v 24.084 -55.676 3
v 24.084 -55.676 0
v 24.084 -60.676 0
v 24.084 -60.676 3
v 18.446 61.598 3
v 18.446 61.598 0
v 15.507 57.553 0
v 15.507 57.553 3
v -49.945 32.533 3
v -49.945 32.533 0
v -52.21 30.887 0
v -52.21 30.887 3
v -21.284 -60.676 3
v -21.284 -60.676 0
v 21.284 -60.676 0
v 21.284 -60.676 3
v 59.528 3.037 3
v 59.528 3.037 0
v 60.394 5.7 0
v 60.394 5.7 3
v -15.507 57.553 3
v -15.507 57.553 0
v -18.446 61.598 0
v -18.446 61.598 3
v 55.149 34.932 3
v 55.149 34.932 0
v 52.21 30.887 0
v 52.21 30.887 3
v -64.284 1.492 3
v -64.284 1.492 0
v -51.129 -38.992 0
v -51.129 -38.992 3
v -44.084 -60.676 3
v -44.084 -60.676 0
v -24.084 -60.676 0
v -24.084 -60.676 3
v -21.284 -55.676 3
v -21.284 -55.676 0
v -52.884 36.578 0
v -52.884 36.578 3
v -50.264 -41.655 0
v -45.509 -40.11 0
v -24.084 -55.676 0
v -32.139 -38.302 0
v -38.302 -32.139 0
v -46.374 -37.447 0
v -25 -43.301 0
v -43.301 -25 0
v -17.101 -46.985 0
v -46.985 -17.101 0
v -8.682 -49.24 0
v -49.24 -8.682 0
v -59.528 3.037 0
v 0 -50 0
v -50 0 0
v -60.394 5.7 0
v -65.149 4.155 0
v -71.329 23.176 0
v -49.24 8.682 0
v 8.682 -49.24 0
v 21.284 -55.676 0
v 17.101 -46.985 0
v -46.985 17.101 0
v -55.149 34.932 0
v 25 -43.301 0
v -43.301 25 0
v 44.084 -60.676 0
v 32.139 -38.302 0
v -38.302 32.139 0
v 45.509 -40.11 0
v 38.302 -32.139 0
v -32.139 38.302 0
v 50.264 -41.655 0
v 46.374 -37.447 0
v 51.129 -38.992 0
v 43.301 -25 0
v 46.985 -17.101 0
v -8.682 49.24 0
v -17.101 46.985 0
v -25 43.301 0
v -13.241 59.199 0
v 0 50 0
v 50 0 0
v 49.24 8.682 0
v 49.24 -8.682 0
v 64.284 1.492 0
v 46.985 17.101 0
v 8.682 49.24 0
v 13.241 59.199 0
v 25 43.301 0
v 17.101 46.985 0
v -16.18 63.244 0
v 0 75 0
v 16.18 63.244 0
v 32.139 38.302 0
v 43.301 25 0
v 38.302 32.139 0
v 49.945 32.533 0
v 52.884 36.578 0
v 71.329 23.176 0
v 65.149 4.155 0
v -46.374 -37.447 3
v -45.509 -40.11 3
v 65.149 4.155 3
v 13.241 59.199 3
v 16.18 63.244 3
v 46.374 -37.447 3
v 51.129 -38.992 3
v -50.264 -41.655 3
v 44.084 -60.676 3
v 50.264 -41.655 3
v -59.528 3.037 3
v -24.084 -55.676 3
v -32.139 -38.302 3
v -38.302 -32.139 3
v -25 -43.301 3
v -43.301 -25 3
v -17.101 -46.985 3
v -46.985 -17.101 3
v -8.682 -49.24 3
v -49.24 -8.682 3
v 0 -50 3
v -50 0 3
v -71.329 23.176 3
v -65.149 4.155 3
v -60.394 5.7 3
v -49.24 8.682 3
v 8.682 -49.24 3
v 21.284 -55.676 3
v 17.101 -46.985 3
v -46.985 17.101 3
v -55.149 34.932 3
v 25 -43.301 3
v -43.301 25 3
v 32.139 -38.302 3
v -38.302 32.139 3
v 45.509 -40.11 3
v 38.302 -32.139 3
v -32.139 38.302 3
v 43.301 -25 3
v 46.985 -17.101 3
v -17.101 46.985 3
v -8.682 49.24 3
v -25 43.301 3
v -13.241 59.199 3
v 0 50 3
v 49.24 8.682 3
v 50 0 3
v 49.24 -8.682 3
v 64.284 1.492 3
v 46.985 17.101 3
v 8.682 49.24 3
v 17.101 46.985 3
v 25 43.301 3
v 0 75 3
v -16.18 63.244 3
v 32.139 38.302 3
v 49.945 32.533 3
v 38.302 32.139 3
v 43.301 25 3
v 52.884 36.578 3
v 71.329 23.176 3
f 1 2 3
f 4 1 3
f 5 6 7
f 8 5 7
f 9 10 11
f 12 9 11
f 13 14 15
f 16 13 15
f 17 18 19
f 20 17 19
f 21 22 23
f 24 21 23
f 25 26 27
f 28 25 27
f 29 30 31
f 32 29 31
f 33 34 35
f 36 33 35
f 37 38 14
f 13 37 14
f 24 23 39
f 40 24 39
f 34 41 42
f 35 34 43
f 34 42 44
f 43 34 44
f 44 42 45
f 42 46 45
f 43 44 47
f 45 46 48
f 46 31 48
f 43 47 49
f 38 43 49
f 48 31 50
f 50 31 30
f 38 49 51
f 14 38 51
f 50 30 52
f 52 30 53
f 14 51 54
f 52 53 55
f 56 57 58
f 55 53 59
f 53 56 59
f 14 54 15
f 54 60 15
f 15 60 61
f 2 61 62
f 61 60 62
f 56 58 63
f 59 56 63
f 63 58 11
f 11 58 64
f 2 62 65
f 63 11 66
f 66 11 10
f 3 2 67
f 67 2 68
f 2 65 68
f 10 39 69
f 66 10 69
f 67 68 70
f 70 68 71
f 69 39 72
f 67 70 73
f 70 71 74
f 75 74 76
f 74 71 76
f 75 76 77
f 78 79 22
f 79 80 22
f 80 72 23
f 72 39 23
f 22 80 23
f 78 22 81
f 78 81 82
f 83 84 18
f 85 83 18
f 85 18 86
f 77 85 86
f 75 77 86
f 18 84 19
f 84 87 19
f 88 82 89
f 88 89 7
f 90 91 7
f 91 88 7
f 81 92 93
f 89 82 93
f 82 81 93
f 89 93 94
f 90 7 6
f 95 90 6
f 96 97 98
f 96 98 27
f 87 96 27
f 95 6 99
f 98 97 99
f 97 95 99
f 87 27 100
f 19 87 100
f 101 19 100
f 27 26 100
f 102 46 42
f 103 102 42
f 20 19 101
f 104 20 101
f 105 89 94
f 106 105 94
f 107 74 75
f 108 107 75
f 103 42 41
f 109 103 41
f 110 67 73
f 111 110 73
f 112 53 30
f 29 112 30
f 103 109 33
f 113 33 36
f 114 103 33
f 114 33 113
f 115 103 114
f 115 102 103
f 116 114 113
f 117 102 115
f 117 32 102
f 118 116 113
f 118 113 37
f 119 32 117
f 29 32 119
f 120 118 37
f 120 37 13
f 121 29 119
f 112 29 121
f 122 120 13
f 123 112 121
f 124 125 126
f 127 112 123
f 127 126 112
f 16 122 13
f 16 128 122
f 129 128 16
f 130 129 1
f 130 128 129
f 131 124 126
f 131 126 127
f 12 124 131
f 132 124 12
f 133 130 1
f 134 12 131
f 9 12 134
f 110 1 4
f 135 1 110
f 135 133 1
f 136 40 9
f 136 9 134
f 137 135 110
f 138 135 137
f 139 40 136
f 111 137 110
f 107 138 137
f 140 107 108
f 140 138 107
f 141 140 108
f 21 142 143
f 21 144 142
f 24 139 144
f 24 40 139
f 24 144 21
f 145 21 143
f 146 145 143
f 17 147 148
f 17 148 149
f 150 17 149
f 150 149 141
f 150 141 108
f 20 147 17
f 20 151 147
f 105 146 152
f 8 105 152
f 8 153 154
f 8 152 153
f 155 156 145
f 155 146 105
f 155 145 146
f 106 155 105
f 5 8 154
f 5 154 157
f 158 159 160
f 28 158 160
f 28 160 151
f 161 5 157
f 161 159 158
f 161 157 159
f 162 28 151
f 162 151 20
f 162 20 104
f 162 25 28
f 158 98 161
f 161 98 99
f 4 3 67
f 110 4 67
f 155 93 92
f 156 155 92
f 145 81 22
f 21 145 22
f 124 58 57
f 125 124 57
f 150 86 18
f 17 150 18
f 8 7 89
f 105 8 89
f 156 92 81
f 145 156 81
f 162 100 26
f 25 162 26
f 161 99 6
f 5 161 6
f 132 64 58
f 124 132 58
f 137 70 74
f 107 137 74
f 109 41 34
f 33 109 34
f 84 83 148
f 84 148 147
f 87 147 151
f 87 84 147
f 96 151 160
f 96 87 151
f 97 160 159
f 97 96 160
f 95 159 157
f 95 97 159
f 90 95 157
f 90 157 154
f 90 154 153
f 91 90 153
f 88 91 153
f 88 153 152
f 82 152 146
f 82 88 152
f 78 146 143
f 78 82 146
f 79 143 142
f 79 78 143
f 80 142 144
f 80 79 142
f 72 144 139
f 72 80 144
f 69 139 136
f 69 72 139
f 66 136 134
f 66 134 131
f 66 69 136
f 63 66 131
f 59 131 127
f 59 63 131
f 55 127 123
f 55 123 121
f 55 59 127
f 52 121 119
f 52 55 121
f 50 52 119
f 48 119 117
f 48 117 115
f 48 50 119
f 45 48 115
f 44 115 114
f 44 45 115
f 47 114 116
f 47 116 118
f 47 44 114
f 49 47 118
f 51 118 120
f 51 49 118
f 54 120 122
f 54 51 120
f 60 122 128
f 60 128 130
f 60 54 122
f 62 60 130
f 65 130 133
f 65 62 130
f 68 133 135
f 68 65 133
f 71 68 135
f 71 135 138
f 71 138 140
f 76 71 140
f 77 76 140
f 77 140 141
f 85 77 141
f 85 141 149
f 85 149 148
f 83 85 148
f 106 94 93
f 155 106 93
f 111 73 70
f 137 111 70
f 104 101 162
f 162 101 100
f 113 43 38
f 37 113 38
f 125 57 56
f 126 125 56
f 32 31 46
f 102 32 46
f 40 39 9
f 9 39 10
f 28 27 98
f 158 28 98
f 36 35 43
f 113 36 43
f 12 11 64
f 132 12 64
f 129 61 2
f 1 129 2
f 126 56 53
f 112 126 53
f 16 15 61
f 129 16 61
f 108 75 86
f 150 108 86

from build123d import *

# Parameters (mm, degrees)
F0_R     = 50
F1_DEPTH = 3


with BuildPart() as f1:
    # F0 (on Top) → F1 (new body)
    with BuildSketch(Plane.XY):
        Polygon((16.18034, 63.244295), (0, 75), (-16.18034, 63.244295), (-13.241414, 59.19921), (-15.506661, 57.553411), (-18.445587, 61.598496), (-52.883651, 36.577778), (-49.944725, 32.532693), (-52.209973, 30.886895), (-55.148899, 34.93198), (-71.329239, 23.176275), (-65.148899, 4.155144), (-60.393616, 5.700229), (-59.528369, 3.037271), (-64.283651, 1.492186), (-51.129481, -38.992186), (-46.374199, -37.447101), (-45.508951, -40.110059), (-50.264234, -41.655144), (-44.083894, -60.676275), (-24.083894, -60.676275), (-24.083894, -55.676275), (-21.283894, -55.676275), (-21.283894, -60.676275), (21.283894, -60.676275), (21.283894, -55.676275), (24.083894, -55.676275), (24.083894, -60.676275), (44.083894, -60.676275), (50.264234, -41.655144), (45.508951, -40.110059), (46.374199, -37.447101), (51.129481, -38.992186), (64.283651, 1.492186), (59.528369, 3.037271), (60.393616, 5.700229), (65.148899, 4.155144), (71.329239, 23.176275), (55.148899, 34.93198), (52.209973, 30.886895), (49.944725, 32.532693), (52.883651, 36.577778), (18.445587, 61.598496), (15.506661, 57.553411), (13.241414, 59.19921), align=None)
        Circle(F0_R, mode=Mode.SUBTRACT)
    extrude(amount=F1_DEPTH)


solid = f1.part
